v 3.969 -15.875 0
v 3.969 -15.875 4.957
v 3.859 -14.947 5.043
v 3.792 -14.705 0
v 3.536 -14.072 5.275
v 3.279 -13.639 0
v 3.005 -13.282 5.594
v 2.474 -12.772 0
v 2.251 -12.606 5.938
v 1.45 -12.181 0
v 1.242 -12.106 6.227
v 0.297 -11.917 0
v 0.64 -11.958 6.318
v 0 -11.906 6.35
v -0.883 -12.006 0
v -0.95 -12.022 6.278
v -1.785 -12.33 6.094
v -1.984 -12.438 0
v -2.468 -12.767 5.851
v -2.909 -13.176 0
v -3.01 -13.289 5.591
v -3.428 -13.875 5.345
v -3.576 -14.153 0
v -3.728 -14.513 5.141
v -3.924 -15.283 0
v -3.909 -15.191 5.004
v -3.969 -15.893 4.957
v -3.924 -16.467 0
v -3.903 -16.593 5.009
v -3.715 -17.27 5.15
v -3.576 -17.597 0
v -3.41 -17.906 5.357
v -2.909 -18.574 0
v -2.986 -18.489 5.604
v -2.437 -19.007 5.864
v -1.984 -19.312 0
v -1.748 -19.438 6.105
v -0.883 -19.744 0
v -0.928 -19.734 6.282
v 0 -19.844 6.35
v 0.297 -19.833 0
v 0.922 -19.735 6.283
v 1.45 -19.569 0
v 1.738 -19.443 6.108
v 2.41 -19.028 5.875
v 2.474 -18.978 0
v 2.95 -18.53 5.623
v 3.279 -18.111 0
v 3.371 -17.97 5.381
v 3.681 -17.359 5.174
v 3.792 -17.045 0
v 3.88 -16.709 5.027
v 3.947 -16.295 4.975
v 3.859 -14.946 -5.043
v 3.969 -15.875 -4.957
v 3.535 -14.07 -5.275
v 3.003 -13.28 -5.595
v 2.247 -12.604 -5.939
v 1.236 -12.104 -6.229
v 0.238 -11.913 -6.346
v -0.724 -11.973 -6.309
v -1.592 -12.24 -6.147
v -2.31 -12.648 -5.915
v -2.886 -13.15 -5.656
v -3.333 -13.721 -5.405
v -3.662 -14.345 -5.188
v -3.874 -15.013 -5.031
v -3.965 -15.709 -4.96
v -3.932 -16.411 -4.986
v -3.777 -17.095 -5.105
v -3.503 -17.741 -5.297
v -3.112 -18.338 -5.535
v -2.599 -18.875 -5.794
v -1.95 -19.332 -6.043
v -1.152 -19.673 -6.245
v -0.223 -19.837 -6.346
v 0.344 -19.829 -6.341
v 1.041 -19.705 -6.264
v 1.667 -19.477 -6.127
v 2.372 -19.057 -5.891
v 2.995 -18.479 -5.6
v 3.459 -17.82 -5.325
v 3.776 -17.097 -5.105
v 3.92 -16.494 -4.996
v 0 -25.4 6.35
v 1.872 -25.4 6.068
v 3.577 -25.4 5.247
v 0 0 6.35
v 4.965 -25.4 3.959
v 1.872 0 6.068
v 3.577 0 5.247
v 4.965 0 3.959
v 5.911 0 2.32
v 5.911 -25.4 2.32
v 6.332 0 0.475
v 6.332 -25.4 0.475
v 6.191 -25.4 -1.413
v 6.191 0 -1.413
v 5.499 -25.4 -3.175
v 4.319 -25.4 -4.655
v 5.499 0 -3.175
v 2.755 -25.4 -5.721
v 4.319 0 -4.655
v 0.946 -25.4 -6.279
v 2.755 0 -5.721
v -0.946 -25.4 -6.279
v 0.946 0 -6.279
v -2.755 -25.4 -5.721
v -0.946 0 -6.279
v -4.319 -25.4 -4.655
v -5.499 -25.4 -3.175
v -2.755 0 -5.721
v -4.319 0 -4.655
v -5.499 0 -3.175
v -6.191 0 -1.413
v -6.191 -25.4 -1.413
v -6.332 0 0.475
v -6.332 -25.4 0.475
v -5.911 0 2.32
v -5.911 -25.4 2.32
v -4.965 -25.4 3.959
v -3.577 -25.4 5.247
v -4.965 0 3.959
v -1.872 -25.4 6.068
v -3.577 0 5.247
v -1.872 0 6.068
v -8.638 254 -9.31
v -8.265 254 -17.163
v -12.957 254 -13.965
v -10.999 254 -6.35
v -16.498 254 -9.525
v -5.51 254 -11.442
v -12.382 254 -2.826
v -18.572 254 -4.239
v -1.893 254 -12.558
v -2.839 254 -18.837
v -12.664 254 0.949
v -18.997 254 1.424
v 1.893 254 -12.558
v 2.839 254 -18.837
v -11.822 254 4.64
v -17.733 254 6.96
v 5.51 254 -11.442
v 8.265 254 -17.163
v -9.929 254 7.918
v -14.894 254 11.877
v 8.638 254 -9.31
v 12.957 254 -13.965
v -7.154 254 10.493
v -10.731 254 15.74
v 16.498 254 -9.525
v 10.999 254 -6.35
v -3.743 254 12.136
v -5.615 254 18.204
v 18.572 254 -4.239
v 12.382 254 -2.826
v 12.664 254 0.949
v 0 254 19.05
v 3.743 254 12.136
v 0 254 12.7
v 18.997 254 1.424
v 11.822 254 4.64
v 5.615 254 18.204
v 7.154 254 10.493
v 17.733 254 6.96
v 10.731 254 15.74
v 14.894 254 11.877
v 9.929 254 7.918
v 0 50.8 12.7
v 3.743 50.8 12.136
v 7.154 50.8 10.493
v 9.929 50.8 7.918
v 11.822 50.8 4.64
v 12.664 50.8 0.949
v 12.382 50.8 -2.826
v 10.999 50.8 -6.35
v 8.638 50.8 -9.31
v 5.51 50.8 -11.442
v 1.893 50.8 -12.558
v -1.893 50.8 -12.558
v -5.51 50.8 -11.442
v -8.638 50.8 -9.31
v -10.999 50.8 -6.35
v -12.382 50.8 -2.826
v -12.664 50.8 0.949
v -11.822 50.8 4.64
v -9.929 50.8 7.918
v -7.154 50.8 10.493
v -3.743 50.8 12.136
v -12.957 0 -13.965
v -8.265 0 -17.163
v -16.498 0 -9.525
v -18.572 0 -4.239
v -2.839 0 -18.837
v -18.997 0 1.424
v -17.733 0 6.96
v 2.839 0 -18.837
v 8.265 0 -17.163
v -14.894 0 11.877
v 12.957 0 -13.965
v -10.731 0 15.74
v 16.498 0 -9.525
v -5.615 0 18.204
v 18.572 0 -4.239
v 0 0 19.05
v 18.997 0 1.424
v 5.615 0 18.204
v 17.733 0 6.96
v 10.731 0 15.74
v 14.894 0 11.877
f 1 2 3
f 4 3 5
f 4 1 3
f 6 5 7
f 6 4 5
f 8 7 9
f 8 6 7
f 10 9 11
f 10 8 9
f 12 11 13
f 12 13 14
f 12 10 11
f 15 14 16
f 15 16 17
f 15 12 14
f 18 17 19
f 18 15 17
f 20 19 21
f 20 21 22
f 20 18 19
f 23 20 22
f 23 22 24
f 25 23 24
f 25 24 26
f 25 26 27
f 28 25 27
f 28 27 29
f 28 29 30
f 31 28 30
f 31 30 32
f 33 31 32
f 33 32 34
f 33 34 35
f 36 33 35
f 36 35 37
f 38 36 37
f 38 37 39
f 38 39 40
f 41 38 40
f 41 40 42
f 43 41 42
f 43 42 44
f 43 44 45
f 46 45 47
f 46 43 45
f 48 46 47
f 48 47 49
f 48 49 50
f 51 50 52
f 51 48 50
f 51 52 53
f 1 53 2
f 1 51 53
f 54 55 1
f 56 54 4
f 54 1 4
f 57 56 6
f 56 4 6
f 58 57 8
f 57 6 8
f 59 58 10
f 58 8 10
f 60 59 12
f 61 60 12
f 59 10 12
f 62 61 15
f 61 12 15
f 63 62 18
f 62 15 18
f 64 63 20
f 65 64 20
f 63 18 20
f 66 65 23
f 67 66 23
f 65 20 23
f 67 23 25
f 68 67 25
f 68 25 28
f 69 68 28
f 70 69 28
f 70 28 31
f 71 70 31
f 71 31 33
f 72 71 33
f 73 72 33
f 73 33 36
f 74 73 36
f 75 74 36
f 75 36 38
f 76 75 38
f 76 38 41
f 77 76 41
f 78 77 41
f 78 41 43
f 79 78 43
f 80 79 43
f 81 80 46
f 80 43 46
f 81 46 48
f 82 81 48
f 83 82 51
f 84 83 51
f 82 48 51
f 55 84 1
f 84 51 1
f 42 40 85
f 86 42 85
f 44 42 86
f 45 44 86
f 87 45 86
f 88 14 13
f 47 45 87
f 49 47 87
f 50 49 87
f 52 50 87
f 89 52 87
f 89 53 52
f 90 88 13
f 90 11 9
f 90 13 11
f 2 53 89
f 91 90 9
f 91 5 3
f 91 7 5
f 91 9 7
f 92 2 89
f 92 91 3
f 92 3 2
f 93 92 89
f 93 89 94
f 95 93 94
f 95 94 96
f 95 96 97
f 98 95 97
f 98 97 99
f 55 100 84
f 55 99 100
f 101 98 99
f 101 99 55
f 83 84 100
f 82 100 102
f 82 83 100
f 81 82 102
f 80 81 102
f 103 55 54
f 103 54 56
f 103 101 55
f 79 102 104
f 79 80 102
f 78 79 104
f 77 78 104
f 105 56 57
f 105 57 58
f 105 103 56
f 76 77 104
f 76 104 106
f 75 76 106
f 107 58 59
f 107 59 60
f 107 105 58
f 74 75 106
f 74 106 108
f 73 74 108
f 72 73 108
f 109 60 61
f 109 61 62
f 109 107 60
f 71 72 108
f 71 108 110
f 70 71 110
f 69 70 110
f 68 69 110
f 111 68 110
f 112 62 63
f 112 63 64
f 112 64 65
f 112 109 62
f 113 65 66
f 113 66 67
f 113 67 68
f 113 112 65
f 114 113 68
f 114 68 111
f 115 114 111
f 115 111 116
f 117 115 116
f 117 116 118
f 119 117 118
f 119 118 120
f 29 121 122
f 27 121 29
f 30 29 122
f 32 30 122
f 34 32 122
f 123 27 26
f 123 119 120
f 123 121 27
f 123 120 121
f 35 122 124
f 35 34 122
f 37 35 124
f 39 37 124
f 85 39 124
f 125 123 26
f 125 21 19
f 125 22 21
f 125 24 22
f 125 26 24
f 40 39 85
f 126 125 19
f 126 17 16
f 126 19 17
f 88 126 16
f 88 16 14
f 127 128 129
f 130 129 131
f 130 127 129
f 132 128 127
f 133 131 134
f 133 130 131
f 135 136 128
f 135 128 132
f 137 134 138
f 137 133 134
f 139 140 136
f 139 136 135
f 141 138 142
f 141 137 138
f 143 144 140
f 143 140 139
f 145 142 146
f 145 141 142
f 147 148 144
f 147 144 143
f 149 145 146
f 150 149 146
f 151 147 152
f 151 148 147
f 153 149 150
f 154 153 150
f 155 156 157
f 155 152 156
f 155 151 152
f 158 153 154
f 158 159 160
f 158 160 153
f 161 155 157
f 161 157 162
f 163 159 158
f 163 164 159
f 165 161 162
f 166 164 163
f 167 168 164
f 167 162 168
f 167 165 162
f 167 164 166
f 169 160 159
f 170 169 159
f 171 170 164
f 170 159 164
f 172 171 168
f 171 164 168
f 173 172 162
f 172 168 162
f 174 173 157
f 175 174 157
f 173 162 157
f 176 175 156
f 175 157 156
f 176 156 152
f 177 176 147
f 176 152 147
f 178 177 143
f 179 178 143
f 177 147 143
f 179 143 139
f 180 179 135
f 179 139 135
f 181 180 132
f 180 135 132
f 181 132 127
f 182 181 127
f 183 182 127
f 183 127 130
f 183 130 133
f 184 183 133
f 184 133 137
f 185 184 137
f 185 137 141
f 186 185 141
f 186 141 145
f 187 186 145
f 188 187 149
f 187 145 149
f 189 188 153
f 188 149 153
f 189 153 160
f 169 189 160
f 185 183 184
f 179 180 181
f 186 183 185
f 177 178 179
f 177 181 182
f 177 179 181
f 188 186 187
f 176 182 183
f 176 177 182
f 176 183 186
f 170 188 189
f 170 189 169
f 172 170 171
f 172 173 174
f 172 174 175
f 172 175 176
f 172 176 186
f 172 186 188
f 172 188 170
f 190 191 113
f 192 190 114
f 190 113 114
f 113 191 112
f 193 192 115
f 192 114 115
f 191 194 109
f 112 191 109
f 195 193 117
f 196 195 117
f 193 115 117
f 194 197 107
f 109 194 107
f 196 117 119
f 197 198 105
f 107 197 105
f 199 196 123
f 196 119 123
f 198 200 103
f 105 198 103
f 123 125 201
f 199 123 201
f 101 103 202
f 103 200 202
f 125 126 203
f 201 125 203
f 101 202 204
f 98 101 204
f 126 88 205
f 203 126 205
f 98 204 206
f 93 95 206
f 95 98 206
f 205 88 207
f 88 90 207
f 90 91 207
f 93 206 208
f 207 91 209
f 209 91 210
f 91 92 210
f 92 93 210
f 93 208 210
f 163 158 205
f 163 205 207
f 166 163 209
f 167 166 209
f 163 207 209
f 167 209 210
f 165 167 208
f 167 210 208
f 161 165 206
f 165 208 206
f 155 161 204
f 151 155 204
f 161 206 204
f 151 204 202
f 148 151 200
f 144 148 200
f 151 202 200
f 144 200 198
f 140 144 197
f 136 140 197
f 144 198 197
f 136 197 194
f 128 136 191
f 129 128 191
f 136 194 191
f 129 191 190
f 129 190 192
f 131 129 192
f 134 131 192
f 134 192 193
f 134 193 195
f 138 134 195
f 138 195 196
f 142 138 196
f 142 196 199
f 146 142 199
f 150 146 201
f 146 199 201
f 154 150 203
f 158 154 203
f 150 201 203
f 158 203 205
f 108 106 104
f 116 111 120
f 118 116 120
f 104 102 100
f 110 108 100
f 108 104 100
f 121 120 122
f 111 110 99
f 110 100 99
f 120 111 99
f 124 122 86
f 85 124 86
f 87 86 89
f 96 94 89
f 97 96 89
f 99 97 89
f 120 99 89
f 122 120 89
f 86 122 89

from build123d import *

# Parameters (mm, degrees)
SKETCH1_R               = 19.05
BOSS_EXTRUDE1_DEPTH     = 254
SKETCH1_3_R             = 6.35
BOSS_EXTRUDE2_DEPTH     = 25.4
SKETCH2_R               = 12.7
CUT_EXTRUDE1_DEPTH      = 203.2
CUT_EXTRUDE2_DEPTH      = 256.424754086
CUT_EXTRUDE2_DEPTH_BACK = 256.424754086
SKETCH3_R               = 3.96875


with BuildPart() as part:
    # Sketch1 → Boss-Extrude1 (new body)
    with BuildSketch(Plane(origin=(0, 0, 0), x_dir=(1, 0, 0), z_dir=(0, 1, 0))):
        Circle(SKETCH1_R)
    extrude(amount=BOSS_EXTRUDE1_DEPTH)

    # Sketch1<3> → Boss-Extrude2 (add)
    with BuildSketch(Plane(origin=(0, 0, 0), x_dir=(1, 0, 0), z_dir=(0, 1, 0))):
        Circle(SKETCH1_3_R)
    extrude(amount=-BOSS_EXTRUDE2_DEPTH)

    # Sketch2 → Cut-Extrude1 (cut)
    with BuildSketch(Plane(origin=(0, 254, 0), x_dir=(1, 0, 0), z_dir=(0, 1, 0))):
        Circle(SKETCH2_R)
    extrude(amount=-CUT_EXTRUDE1_DEPTH, mode=Mode.SUBTRACT)

    # Sketch3 → Cut-Extrude2 (cut, two sides: drawn at the far end of the back side and taken through both)
    with BuildSketch(Plane.XY.offset(-CUT_EXTRUDE2_DEPTH_BACK)):
        with Locations((0, -15.875)):
            Circle(SKETCH3_R)
    extrude(amount=CUT_EXTRUDE2_DEPTH + CUT_EXTRUDE2_DEPTH_BACK, mode=Mode.SUBTRACT)


solid = part.part
